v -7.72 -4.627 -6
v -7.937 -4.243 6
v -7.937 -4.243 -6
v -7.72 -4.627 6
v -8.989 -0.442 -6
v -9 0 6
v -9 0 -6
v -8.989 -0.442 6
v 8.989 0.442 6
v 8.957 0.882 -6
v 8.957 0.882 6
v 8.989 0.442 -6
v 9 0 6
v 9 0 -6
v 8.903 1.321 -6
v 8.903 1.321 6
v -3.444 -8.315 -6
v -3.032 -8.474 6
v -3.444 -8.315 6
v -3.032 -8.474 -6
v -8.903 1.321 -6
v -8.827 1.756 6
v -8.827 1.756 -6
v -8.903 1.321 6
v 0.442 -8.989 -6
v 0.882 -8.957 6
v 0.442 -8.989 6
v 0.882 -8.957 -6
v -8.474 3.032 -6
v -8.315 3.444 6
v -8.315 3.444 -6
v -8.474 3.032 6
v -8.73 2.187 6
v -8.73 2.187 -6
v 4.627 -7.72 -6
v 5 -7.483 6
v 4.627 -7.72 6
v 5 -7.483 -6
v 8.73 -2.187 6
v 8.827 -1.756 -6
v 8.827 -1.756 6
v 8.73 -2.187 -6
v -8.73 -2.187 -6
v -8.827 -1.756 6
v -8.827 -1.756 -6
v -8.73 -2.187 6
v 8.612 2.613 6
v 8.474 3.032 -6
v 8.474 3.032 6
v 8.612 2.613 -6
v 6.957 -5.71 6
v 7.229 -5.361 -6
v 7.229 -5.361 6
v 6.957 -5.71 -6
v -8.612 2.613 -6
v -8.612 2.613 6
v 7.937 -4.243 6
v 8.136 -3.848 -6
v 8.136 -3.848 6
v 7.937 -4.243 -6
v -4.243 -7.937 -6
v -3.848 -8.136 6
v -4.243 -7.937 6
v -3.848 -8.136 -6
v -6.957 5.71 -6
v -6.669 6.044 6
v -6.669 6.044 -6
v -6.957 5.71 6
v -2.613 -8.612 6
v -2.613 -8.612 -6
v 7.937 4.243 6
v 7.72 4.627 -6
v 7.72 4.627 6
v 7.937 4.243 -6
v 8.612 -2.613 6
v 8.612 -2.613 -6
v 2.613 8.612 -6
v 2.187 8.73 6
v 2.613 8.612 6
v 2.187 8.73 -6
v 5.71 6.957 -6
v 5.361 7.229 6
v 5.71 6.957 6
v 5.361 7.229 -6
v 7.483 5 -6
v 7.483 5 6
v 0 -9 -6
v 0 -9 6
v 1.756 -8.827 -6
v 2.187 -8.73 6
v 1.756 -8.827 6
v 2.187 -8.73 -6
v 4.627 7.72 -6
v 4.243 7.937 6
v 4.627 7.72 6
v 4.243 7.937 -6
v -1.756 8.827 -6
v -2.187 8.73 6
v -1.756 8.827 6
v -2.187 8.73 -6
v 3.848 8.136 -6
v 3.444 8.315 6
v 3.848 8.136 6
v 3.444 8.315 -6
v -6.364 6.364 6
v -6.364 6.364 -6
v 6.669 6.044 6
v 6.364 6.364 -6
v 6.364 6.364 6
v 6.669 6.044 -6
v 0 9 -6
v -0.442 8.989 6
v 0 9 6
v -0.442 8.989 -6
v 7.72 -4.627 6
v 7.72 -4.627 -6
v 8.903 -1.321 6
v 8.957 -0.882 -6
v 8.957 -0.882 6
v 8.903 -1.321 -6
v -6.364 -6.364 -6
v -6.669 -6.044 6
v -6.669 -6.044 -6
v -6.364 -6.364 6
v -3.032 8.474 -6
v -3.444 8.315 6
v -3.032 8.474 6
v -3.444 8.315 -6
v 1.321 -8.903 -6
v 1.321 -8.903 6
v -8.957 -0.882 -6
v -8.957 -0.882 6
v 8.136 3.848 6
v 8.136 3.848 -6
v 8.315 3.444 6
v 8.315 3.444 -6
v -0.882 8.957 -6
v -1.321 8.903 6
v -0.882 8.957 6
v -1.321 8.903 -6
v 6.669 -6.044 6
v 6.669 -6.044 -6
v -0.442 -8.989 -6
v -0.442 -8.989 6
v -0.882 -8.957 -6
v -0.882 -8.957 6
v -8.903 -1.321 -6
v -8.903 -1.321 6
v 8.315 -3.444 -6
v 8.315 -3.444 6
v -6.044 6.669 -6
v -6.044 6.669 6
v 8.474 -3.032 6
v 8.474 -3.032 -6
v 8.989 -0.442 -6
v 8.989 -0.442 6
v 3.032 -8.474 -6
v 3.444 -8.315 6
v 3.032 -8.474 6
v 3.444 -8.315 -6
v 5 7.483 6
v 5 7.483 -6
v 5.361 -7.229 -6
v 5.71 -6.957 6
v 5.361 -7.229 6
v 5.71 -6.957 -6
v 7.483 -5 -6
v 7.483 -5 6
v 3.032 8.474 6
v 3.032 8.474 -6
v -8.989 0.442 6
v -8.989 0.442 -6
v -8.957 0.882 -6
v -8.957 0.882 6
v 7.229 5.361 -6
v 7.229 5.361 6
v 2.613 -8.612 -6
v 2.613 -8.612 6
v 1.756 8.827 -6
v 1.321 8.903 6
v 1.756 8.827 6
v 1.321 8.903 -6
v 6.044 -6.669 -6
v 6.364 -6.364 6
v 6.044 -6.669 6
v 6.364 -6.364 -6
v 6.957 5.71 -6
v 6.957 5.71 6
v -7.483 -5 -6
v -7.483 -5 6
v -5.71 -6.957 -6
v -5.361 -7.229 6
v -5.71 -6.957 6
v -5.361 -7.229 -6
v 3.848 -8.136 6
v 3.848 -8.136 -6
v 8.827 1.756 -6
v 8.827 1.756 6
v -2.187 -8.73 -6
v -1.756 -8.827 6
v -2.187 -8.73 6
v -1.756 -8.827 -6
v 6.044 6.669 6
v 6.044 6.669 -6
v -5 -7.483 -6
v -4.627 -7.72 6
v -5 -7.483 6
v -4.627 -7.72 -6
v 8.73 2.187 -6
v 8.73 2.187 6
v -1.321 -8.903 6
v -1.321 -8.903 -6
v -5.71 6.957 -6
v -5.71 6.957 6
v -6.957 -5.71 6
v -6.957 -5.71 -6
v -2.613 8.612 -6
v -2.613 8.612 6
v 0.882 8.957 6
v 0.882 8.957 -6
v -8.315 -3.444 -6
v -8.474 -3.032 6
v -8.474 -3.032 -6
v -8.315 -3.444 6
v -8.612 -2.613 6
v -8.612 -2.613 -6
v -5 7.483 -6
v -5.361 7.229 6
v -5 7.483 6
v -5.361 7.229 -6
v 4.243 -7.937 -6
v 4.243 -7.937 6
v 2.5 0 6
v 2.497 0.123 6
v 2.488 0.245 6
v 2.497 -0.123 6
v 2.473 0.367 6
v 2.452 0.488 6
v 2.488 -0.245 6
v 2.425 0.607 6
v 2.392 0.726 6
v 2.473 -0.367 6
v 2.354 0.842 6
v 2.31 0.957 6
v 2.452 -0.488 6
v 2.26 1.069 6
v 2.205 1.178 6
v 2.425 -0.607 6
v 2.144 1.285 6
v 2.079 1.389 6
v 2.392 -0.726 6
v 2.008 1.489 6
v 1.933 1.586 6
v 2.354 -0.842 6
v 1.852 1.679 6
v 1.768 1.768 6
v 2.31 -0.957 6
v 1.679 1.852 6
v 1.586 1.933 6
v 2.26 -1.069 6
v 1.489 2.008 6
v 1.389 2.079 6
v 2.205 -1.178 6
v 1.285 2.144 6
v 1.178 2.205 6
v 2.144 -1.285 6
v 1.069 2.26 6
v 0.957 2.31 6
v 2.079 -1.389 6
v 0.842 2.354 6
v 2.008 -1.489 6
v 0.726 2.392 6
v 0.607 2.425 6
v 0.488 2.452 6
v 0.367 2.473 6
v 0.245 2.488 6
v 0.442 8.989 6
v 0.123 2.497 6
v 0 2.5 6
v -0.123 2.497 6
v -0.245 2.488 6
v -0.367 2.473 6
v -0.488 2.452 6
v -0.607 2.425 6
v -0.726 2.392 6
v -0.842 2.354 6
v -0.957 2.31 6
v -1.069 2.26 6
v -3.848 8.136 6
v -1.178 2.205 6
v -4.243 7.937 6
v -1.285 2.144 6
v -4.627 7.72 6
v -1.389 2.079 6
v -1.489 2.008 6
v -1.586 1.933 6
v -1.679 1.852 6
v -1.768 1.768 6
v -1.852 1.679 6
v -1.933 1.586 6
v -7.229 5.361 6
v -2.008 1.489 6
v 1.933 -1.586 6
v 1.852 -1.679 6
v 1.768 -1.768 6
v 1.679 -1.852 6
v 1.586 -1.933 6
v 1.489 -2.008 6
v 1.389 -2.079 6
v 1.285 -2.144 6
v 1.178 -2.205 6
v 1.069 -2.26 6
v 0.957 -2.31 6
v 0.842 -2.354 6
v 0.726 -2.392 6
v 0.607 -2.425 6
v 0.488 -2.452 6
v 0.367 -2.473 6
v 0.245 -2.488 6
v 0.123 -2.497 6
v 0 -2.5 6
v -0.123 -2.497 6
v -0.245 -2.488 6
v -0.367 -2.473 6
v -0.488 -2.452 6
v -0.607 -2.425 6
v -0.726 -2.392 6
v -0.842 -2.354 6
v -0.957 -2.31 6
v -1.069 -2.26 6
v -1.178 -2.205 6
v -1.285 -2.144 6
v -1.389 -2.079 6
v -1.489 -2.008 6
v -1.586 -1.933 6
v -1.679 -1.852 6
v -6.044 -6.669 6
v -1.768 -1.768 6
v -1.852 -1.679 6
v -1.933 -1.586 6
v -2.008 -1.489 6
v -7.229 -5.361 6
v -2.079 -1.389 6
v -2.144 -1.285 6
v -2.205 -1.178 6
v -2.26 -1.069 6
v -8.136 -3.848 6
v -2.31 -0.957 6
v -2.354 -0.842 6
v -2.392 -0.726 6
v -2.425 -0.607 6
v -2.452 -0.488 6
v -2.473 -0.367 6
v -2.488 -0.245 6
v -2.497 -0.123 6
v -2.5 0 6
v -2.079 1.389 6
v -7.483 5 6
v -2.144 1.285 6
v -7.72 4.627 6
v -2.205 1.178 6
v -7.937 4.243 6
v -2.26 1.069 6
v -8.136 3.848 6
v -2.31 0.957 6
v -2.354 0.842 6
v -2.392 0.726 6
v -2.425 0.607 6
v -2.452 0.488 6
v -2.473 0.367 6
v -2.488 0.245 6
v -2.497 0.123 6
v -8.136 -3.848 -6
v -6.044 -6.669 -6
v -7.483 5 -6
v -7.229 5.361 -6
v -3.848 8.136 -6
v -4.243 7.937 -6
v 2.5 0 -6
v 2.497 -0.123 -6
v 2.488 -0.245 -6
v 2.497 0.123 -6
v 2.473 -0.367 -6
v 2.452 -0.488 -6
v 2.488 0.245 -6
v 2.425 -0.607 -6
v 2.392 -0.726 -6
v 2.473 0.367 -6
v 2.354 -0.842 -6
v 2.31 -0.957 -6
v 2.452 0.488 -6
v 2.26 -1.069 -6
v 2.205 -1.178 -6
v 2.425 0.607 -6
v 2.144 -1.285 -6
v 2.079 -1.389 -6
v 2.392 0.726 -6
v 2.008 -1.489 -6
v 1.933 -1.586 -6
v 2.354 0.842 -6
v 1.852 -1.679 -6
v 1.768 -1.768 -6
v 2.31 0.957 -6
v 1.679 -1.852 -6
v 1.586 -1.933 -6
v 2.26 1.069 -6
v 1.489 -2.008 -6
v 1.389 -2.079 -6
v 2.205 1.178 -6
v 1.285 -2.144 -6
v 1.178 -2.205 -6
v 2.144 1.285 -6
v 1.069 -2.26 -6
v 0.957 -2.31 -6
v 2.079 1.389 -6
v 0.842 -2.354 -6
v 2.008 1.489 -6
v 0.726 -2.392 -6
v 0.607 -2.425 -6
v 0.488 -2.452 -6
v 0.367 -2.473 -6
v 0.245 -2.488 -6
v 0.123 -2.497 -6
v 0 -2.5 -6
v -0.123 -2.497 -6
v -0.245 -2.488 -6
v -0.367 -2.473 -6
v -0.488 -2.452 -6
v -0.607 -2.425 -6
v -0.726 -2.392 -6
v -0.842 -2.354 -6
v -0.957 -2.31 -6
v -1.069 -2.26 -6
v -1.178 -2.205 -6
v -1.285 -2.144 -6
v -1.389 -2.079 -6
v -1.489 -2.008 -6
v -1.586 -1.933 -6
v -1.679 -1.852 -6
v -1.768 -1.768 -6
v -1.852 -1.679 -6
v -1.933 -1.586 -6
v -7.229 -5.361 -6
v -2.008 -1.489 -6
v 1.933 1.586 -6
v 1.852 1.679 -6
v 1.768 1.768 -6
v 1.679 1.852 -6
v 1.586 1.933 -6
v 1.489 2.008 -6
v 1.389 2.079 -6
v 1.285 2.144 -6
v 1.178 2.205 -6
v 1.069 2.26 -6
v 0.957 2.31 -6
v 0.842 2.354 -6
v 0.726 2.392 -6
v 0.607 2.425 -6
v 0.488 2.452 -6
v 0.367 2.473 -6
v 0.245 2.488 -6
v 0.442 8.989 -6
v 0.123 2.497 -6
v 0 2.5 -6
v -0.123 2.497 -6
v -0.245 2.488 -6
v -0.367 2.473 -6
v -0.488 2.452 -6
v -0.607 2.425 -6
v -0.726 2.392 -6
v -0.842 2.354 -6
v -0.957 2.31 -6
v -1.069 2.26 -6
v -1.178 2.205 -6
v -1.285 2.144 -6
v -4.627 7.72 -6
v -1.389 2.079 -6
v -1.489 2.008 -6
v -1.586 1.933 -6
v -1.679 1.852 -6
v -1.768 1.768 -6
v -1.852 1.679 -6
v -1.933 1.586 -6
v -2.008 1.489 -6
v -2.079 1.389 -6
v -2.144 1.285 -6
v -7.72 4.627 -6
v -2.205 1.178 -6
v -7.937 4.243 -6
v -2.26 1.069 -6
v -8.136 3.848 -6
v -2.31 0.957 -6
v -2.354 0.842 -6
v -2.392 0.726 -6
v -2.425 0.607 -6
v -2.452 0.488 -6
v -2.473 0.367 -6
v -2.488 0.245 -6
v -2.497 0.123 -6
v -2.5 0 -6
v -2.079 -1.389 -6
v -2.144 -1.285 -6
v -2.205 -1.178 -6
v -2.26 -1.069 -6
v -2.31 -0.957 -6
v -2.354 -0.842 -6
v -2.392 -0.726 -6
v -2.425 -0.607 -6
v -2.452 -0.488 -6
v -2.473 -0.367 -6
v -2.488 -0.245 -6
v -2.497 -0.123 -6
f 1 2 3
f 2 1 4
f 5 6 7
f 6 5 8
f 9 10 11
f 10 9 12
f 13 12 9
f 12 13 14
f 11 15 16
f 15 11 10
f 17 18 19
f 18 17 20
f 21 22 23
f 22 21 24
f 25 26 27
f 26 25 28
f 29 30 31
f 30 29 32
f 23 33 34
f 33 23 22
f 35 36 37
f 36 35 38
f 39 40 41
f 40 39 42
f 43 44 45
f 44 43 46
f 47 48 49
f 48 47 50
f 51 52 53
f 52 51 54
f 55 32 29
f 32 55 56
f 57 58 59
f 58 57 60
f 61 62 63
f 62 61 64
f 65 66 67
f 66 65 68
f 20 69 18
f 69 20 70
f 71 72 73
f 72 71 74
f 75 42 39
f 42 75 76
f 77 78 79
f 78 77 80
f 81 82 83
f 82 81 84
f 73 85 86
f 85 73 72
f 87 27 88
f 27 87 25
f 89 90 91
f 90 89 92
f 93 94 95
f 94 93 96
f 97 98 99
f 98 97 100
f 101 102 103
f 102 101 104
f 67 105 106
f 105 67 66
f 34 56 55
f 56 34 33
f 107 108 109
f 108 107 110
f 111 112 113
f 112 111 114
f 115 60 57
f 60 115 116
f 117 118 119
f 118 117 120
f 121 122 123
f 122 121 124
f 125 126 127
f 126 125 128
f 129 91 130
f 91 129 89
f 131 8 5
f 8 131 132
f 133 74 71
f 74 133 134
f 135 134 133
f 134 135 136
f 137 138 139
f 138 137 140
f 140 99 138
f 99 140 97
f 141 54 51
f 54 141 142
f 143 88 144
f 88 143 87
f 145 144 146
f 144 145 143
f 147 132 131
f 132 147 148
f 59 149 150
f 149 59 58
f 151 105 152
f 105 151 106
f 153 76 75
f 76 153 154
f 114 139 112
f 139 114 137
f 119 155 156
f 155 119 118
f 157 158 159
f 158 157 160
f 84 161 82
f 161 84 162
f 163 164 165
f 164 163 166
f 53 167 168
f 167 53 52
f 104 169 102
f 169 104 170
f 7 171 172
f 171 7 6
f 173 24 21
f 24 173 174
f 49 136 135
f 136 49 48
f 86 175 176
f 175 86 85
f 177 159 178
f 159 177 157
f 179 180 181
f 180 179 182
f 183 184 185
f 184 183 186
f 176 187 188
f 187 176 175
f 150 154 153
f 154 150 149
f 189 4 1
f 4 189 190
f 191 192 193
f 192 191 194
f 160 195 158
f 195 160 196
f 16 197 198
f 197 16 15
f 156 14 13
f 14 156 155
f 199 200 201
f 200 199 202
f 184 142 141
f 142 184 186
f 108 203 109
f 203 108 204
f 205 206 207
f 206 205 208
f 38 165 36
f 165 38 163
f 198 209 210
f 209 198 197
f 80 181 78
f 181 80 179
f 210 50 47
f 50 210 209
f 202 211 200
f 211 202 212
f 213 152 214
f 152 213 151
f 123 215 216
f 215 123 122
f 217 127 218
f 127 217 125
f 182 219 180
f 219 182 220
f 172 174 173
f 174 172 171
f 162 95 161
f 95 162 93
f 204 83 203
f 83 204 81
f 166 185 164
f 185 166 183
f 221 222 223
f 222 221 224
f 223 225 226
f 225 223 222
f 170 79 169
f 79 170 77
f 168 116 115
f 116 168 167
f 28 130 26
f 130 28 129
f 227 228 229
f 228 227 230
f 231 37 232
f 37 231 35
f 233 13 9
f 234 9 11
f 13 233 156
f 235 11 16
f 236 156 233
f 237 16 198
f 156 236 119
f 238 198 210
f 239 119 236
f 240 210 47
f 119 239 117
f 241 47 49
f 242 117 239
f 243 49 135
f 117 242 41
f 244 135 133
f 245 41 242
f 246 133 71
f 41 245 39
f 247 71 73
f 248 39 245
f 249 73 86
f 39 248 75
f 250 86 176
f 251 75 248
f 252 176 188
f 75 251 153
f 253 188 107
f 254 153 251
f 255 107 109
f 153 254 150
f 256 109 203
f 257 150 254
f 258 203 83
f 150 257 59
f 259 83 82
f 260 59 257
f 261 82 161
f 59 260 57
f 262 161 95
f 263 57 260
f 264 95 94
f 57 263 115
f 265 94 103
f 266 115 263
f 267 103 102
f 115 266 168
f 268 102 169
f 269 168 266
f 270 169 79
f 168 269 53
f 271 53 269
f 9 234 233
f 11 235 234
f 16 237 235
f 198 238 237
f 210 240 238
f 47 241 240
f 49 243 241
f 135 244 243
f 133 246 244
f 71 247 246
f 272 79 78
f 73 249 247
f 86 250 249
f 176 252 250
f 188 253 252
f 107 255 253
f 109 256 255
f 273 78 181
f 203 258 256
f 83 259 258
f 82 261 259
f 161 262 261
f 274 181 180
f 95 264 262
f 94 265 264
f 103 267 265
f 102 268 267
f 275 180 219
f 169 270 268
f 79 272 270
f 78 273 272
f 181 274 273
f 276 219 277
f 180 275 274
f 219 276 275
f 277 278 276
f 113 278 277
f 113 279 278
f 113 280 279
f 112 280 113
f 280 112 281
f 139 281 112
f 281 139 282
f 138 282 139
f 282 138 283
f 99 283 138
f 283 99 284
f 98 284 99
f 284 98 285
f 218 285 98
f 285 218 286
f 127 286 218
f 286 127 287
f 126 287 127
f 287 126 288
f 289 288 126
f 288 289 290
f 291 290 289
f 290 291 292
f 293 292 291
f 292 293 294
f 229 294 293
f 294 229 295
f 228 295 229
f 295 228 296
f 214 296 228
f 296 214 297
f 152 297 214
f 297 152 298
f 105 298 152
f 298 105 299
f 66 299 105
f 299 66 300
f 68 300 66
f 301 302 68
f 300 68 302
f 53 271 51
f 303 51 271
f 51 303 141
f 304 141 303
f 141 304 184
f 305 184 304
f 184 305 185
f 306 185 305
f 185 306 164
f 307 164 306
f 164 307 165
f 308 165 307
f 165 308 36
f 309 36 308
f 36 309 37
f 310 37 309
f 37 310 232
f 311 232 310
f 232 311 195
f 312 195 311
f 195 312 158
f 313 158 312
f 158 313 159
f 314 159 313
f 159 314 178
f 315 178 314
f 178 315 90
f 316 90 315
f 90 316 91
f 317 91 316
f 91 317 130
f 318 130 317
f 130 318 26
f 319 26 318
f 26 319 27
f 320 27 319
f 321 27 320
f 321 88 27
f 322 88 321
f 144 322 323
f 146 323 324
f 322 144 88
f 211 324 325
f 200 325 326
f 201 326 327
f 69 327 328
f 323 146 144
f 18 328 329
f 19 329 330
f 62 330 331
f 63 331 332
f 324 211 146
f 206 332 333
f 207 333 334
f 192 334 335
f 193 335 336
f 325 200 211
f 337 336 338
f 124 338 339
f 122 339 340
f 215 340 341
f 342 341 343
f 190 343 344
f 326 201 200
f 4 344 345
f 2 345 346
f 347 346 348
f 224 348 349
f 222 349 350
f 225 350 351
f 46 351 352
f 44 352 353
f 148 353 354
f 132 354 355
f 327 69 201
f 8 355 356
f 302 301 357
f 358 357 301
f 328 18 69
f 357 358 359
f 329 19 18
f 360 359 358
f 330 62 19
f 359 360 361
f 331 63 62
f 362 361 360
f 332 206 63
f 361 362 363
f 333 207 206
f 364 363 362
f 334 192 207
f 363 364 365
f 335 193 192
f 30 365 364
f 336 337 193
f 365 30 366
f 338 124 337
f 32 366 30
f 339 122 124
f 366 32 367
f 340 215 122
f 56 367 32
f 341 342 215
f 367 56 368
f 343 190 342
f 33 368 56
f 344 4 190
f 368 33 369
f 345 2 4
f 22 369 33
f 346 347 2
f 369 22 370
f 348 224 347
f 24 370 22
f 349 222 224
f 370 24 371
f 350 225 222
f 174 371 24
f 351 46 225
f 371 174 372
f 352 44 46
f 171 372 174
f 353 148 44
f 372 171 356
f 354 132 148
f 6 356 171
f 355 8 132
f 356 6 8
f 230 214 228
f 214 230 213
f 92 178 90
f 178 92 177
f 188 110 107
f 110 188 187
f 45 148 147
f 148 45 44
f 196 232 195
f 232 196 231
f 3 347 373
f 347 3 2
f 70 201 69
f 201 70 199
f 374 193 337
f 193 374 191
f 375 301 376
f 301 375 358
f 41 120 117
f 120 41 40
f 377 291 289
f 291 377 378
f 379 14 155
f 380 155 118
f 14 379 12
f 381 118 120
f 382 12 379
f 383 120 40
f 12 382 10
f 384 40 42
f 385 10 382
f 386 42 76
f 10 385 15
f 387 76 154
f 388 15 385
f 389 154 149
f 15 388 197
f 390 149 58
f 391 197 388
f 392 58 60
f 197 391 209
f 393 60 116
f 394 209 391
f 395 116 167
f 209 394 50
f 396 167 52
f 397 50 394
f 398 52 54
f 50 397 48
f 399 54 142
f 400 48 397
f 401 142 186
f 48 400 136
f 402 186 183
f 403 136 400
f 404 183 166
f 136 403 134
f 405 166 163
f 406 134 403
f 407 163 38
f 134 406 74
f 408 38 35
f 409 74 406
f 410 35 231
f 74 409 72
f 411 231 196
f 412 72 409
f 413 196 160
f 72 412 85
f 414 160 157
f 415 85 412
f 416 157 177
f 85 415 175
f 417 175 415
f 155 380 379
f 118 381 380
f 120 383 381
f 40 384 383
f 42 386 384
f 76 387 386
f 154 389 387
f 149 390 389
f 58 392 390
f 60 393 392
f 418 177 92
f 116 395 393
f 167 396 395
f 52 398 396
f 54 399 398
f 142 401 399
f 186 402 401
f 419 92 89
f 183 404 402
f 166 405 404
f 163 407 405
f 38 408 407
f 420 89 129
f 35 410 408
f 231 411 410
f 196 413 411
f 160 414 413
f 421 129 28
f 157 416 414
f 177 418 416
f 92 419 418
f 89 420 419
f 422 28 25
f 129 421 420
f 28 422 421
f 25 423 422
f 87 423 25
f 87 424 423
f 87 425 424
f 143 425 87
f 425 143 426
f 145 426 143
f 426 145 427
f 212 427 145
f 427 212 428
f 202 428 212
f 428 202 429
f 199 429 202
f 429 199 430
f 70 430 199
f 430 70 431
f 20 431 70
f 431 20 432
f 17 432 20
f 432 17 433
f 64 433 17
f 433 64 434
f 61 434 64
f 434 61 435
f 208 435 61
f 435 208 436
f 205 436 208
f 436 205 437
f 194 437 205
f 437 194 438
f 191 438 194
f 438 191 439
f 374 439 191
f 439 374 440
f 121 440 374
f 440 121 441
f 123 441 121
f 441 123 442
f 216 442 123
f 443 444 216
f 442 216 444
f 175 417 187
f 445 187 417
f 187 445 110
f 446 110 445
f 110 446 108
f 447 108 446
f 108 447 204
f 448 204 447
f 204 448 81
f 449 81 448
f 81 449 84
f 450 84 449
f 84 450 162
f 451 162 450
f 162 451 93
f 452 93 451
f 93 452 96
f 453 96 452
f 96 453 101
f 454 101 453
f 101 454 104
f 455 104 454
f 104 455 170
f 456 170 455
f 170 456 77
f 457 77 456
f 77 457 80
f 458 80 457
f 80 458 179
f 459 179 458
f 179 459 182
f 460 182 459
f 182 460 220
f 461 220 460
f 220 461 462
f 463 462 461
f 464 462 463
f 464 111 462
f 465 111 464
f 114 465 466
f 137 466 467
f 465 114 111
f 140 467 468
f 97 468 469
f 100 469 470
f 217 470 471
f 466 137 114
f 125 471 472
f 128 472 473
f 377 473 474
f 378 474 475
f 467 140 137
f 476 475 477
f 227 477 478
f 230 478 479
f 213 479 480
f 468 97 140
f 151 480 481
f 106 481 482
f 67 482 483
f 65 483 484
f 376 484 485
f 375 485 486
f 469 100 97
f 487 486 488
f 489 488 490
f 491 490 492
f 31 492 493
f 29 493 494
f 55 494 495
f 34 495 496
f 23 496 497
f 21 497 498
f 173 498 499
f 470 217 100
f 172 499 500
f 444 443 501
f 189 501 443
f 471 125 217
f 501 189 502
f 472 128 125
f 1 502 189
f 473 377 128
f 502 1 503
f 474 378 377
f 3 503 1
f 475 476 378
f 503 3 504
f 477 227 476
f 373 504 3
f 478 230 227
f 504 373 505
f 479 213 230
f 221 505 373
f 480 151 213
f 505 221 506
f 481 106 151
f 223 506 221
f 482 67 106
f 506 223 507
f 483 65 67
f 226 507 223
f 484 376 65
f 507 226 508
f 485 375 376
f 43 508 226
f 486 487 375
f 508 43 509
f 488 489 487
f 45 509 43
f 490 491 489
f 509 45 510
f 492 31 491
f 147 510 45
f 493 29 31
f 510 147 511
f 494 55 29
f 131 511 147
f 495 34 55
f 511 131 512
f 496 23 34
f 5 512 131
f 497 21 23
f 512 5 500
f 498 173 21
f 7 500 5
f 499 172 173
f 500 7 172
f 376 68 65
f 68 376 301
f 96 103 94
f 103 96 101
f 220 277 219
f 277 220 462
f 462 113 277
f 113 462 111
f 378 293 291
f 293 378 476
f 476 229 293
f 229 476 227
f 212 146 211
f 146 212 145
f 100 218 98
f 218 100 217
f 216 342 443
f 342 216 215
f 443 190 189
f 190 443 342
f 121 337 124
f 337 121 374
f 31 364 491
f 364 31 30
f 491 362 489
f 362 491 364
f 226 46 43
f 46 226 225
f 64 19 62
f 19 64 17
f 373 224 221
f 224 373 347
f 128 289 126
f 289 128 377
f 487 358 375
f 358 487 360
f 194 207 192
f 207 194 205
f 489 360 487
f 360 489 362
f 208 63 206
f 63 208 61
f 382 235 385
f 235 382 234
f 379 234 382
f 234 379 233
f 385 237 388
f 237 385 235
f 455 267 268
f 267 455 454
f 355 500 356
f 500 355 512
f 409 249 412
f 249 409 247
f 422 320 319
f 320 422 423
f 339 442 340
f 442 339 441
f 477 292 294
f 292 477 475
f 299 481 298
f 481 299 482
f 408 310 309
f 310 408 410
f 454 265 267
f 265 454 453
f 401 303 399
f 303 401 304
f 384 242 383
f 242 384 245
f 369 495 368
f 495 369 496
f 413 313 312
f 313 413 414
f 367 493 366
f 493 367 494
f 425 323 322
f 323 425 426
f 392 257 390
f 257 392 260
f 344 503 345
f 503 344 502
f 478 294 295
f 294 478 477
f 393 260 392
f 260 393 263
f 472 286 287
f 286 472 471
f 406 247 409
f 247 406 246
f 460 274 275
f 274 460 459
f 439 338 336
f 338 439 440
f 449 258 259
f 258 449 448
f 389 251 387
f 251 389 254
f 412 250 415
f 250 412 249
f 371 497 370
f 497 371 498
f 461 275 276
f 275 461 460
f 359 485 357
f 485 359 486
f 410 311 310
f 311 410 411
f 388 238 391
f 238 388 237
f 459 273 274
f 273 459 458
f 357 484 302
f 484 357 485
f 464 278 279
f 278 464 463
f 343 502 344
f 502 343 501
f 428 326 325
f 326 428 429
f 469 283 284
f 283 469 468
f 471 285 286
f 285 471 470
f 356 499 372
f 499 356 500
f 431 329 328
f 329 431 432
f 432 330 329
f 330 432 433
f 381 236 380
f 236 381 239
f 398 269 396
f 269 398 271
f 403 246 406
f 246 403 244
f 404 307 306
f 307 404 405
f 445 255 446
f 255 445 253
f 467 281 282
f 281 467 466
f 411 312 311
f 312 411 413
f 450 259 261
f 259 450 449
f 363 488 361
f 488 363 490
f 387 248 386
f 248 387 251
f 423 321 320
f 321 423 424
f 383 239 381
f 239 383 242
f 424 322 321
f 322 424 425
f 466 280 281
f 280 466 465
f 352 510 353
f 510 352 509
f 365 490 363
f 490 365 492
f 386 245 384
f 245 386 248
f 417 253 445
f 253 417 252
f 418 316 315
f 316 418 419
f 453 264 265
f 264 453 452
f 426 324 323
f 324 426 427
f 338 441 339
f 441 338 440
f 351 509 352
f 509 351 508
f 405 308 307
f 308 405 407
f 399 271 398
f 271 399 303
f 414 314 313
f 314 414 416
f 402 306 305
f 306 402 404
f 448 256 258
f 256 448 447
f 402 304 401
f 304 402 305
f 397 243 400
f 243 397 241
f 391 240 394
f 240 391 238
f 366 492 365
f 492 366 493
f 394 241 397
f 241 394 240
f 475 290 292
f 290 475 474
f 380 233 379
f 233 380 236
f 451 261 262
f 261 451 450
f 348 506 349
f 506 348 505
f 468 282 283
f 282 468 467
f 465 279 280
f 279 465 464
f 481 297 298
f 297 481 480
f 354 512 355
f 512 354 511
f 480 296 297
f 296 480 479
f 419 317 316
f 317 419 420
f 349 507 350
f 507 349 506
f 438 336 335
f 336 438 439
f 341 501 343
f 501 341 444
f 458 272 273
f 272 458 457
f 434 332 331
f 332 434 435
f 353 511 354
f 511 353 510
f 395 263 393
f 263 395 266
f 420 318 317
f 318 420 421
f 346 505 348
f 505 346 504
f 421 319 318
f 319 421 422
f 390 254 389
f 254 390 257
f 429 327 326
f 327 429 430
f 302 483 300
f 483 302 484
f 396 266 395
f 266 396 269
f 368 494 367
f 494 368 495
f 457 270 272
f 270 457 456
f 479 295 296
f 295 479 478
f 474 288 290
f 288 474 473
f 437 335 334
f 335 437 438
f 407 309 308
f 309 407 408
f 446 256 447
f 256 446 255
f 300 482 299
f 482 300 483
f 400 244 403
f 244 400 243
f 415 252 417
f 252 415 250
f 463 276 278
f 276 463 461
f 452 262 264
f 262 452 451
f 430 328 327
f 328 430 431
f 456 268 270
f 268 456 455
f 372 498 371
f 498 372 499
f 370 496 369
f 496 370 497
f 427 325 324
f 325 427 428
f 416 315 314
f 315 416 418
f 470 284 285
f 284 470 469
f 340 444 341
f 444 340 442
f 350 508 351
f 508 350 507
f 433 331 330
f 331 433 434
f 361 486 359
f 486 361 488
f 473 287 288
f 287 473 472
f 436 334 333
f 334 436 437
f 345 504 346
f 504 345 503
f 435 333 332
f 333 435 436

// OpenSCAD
$fn=128;

teeth = 16;
pitch_d = 12.16;          // mm
pitch_r = pitch_d/2;

pulley_width = 10;        // mm
hub_d = 18;               // mm
hub_width = 12;           // mm

bore_d = 5;               // mm

tooth_height = 1.2;       // mm (radial)
tooth_tip_width = 1.2;    // mm (tangential at tip)
tooth_root_width = 2.0;   // mm (tangential at root)

root_r = pitch_r - tooth_height*0.55;
tip_r  = pitch_r + tooth_height*0.45;

module tooth2d() {
    polygon(points=[
        [root_r, -tooth_root_width/2],
        [root_r,  tooth_root_width/2],
        [tip_r,   tooth_tip_width/2],
        [tip_r,  -tooth_tip_width/2]
    ]);
}

module pulley_teeth() {
    for(i=[0:teeth-1]) {
        rotate(i*360/teeth)
            linear_extrude(height=pulley_width, center=true, convexity=10)
                tooth2d();
    }
}

module pulley_body() {
    union() {
        cylinder(d=2*root_r, h=pulley_width, center=true);
        pulley_teeth();
        cylinder(d=hub_d, h=hub_width, center=true);
    }
}

difference() {
    pulley_body();
    cylinder(d=bore_d, h=hub_width+2, center=true);
}
